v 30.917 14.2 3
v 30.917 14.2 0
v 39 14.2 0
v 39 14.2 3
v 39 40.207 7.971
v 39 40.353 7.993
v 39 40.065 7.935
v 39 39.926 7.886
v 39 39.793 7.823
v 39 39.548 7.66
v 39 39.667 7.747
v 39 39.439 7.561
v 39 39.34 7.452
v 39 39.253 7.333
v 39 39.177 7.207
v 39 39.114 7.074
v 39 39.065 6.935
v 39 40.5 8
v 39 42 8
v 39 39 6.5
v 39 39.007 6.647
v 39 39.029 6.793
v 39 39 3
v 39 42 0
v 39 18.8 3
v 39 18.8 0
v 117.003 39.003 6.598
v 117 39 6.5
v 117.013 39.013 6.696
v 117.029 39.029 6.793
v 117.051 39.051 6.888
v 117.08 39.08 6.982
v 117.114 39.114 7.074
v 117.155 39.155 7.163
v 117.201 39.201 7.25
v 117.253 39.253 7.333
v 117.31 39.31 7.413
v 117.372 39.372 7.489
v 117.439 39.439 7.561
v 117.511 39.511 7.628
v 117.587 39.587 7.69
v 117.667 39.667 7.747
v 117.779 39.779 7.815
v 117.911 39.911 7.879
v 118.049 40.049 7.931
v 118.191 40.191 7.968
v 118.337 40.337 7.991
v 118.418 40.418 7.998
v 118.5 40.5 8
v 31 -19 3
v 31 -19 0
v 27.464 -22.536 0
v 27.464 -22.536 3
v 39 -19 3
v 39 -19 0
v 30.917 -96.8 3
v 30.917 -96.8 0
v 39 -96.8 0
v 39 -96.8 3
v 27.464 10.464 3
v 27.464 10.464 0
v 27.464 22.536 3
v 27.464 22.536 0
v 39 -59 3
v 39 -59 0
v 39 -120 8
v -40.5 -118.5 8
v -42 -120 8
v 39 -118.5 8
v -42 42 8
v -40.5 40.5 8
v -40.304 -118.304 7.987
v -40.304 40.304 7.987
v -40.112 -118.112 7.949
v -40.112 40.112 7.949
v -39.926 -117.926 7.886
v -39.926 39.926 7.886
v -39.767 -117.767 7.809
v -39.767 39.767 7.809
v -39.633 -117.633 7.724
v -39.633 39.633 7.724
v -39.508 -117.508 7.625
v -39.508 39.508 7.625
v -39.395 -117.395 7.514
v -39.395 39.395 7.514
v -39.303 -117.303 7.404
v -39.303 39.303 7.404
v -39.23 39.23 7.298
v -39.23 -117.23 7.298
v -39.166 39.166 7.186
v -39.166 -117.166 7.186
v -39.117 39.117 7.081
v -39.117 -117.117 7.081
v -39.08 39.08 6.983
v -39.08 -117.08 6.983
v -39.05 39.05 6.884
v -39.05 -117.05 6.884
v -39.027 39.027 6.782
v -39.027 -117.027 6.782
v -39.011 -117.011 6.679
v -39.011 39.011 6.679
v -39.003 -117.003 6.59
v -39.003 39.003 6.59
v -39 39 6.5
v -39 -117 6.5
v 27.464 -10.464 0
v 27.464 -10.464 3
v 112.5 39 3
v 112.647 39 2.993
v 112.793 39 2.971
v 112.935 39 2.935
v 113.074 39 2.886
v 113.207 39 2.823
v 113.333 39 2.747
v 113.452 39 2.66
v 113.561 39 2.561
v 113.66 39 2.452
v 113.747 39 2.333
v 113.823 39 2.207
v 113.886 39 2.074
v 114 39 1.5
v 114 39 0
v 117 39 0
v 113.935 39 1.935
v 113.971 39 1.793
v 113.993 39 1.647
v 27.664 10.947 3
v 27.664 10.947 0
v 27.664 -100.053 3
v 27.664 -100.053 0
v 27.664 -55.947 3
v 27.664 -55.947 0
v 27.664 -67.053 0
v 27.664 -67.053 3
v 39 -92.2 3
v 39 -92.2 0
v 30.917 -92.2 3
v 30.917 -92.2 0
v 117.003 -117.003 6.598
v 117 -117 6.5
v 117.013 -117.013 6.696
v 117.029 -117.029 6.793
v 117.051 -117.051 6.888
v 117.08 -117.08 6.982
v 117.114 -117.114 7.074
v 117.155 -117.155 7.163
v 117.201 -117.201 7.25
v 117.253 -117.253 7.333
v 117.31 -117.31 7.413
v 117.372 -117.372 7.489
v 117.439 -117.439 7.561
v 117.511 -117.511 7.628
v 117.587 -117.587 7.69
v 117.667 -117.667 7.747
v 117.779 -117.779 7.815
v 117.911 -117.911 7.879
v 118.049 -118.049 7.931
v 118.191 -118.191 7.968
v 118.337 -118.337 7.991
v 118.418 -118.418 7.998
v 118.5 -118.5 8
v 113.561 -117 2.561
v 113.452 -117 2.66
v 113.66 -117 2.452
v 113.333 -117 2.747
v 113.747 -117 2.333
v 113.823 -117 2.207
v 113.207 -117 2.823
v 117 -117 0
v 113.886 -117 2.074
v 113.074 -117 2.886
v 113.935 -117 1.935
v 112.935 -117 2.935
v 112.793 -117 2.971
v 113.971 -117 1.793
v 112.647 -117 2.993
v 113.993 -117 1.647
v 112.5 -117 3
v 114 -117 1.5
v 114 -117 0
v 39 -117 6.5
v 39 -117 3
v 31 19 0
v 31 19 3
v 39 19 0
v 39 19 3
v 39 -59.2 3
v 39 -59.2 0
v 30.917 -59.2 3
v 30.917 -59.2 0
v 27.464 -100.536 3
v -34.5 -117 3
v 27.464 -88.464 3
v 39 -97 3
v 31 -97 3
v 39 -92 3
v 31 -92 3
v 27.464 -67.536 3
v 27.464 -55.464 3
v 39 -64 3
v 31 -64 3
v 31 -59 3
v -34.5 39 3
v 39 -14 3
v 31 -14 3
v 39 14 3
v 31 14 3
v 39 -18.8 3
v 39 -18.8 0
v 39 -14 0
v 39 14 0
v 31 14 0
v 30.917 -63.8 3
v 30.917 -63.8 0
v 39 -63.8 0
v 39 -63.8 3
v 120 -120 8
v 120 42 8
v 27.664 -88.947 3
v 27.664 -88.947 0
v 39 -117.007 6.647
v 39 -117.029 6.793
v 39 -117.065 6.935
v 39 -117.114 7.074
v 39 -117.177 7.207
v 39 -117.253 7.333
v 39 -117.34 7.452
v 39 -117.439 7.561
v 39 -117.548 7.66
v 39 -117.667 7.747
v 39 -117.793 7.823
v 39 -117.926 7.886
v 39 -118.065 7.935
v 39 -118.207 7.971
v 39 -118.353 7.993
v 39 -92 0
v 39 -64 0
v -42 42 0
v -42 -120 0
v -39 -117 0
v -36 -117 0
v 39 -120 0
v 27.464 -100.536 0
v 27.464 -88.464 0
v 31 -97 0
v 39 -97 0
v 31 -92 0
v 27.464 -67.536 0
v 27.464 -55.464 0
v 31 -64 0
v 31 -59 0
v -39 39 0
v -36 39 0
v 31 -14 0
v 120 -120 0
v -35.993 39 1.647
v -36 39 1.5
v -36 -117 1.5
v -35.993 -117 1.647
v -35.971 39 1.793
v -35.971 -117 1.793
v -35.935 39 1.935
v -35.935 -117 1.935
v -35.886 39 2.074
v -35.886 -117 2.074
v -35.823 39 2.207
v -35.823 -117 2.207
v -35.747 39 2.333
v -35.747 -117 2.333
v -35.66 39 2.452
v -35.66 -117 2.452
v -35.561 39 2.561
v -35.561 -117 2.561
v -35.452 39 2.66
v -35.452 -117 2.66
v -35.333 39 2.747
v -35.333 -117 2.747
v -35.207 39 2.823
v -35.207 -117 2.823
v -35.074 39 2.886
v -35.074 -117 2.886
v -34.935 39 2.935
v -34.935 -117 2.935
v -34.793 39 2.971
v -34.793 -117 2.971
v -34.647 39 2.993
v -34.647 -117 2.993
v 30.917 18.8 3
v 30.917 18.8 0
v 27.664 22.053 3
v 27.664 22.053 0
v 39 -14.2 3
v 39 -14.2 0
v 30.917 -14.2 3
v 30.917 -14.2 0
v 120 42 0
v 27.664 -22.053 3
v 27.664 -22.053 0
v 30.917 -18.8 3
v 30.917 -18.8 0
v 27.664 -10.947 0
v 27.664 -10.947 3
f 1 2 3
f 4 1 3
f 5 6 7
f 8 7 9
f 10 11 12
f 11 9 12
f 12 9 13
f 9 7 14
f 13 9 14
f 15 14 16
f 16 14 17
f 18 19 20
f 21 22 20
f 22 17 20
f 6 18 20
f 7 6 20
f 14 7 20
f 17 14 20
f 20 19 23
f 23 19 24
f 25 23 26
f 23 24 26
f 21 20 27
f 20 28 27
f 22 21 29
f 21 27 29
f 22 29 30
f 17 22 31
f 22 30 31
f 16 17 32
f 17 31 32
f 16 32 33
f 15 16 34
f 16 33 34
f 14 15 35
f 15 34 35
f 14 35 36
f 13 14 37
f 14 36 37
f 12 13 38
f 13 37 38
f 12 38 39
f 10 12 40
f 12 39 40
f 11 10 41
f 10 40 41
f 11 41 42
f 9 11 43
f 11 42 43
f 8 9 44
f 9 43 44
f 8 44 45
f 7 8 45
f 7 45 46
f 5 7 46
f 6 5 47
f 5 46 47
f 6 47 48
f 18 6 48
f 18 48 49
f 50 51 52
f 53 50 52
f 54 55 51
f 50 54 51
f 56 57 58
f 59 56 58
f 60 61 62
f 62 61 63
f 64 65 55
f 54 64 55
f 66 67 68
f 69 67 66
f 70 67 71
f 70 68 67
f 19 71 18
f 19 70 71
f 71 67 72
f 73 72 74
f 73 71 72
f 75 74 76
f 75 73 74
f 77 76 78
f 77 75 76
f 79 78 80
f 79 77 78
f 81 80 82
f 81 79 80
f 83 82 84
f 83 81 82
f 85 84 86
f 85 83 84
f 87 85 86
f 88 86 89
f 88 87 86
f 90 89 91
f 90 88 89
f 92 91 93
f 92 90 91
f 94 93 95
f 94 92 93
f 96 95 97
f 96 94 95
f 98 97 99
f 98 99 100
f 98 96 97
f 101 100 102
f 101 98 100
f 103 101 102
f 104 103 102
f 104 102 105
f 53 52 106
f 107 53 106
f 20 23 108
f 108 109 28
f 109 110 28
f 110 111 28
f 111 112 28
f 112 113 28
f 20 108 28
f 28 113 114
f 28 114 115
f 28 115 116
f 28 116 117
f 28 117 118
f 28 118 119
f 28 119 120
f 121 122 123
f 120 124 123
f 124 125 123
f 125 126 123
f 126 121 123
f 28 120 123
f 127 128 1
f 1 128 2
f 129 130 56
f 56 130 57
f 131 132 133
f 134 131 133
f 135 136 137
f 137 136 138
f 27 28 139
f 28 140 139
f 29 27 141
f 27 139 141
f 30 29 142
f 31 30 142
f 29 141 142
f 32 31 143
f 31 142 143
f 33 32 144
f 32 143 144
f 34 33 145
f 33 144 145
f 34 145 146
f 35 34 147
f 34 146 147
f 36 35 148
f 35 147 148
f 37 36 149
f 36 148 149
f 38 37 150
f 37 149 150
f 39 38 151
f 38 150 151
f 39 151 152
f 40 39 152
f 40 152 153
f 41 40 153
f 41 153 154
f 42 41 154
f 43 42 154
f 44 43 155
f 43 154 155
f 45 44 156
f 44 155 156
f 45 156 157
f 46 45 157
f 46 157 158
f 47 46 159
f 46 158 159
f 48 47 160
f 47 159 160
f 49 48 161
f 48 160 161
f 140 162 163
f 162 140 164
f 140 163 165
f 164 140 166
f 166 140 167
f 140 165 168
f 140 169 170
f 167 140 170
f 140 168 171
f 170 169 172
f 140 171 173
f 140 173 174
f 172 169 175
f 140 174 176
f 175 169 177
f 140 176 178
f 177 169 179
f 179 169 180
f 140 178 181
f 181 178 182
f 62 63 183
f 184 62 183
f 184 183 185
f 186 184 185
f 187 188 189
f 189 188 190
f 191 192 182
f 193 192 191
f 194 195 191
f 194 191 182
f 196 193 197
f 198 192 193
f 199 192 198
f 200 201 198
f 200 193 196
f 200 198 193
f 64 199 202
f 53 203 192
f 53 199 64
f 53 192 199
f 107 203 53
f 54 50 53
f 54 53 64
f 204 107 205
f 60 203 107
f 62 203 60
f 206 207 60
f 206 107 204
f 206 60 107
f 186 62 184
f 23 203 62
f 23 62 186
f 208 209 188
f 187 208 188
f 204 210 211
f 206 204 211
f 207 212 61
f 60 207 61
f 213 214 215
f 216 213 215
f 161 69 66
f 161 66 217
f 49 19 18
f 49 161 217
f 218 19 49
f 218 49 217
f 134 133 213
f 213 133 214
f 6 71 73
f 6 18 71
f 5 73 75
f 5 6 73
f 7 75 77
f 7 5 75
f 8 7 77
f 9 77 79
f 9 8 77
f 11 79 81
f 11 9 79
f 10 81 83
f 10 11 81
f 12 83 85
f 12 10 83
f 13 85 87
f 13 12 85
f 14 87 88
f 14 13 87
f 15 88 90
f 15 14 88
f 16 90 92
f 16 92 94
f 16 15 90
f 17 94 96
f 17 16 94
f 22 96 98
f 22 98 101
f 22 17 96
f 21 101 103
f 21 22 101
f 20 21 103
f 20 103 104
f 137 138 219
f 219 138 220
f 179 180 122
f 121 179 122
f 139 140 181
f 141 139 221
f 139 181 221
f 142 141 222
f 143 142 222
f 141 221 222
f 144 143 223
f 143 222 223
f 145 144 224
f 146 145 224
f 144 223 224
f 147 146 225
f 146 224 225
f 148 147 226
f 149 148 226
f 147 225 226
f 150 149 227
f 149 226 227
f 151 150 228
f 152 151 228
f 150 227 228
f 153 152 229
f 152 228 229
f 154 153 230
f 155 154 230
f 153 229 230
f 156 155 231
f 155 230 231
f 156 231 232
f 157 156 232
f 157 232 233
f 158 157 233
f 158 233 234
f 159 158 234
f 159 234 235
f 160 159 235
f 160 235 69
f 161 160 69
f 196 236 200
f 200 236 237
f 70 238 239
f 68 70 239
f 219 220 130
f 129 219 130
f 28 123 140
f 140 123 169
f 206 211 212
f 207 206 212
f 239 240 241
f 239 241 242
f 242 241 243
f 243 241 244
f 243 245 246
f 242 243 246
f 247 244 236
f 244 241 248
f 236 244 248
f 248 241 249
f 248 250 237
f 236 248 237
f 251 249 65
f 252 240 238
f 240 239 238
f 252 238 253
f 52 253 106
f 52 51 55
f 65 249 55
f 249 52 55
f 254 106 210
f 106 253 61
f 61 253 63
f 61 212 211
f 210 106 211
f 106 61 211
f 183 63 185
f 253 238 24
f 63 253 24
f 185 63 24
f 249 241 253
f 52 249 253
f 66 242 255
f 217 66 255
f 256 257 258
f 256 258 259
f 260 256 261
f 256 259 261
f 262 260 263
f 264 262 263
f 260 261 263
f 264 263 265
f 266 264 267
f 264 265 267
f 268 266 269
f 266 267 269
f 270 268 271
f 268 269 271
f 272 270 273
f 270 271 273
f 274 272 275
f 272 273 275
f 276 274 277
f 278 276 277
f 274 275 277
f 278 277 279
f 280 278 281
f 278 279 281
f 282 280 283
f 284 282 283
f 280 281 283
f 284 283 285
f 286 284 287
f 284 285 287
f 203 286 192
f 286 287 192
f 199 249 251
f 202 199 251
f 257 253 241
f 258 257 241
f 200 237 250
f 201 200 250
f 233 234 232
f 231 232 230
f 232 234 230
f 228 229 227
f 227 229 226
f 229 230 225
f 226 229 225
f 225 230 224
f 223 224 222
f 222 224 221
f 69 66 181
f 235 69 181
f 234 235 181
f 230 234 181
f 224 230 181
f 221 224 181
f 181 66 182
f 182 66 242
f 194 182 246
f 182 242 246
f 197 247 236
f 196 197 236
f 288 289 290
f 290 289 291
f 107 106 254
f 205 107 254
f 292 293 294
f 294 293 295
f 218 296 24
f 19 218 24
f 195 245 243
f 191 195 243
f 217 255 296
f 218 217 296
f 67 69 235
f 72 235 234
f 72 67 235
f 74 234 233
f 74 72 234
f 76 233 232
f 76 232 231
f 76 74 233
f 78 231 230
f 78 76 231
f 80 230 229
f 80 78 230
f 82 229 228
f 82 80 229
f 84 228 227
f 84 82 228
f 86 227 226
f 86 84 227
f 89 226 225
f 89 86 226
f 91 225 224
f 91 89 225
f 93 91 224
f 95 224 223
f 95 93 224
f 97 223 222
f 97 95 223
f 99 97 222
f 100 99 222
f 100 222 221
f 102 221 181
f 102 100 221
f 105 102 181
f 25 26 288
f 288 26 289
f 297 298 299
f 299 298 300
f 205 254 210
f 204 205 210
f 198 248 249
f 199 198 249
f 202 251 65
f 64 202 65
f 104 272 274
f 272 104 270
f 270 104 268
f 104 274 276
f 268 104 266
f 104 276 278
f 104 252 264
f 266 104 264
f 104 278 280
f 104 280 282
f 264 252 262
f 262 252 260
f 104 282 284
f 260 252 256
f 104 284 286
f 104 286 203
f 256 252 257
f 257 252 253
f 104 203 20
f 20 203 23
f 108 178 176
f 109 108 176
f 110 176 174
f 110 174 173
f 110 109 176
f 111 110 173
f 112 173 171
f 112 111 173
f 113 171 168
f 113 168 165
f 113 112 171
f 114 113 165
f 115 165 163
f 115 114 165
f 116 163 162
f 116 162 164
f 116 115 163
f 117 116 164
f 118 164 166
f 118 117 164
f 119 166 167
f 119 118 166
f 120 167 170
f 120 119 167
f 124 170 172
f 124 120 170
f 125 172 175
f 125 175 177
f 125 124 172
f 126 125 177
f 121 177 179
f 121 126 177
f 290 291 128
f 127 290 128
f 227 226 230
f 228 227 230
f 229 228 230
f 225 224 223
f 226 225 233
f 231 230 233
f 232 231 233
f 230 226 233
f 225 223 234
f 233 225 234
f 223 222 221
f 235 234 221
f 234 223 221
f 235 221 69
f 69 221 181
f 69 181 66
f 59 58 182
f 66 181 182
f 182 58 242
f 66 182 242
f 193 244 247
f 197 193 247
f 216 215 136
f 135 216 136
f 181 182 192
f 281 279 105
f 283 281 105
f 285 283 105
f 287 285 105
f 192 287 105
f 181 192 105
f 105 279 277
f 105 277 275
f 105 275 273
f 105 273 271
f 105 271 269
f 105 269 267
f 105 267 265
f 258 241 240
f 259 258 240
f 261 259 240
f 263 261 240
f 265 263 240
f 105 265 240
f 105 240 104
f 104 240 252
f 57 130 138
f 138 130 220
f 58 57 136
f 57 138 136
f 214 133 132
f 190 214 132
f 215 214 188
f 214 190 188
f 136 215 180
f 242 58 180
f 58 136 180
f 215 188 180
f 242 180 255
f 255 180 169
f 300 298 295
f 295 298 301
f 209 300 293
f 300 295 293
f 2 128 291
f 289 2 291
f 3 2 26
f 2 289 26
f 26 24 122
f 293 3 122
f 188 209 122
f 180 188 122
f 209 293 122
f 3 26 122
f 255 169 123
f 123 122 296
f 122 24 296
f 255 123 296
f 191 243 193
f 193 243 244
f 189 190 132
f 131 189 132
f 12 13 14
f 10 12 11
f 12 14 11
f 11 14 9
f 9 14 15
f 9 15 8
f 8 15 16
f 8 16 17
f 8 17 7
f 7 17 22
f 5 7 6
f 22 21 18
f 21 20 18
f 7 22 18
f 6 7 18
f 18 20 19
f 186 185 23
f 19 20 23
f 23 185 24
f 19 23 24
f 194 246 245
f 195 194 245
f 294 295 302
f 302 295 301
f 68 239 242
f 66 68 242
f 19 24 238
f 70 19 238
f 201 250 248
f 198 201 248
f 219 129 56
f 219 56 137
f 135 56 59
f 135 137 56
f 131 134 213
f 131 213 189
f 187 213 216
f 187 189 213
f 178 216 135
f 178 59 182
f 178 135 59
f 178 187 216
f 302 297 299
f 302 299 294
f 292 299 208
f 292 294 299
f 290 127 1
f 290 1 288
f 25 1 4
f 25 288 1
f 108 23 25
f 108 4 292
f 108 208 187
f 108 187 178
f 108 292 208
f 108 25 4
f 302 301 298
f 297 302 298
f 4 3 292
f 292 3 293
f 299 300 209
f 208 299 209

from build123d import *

# Parameters (mm, degrees)
F1_DEPTH = 8
F2_DEPTH = 3
F3_DEPTH = 3
F4_DEPTH = 8
F5_R     = 1.5
F5_2_R   = 1.5


with BuildPart() as f1:
    # F0 (on Top) → F1 (new body)
    with BuildSketch(Plane.XY):
        Polygon((-39, -39), (-39, 39), (-36, 39), (39, 39), (39, 42), (-42, 42), (-42, -39), (-42, -120), (39, -120), (39, -117), (-36, -117), (-39, -117), align=None)
    extrude(amount=F1_DEPTH)

    # F0 (on Top) → F2 (join)
    with BuildSketch(Plane.XY):
        Polygon((39, 39), (-36, 39), (-36, -117), (39, -117), (39, -97), (31, -97), (27.4644660941, -100.5355339059), (27.4644660941, -88.4644660941), (31, -92), (39, -92), (39, -64), (31, -64), (27.4644660941, -67.5355339059), (27.4644660941, -55.4644660941), (31, -59), (39, -59), (39, -19), (31, -19), (27.4644660941, -22.5355339059), (27.4644660941, -10.4644660941), (31, -14), (39, -14), (39, 14), (31, 14), (27.4644660941, 10.4644660941), (27.4644660941, 22.5355339059), (31, 19), (39, 19), align=None)
    extrude(amount=F2_DEPTH)

    # F5
    f5_edges = [f1.edges().sort_by_distance(p)[0] for p in [
        (0, 39, 8),
        (0, -117, 8),
        (-39, -39, 8),
        (-36, -39, 3),
    ]]
    fillet(f5_edges, radius=F5_R)


with BuildPart() as f3:
    # F0 (on Top) → F3 (new body)
    with BuildSketch(Plane.XY):
        Polygon((114, 39), (39, 39), (39, 19), (39, 18.8), (39, 14.2), (39, 14), (39, -14), (39, -14.2), (39, -18.8), (39, -19), (39, -59), (39, -59.2), (39, -63.8), (39, -64), (39, -92), (39, -92.2), (39, -96.8), (39, -97), (39, -117), (114, -117), align=None)
        Polygon((39, 42), (39, 39), (114, 39), (117, 39), (117, -39), (117, -117), (114, -117), (39, -117), (39, -120), (120, -120), (120, -39), (120, 42), align=None)
        Polygon((30.9171572875, -96.8), (39, -96.8), (39, -92.2), (30.9171572875, -92.2), (27.6644660941, -88.9473088065), (27.6644660941, -100.0526911935), align=None)
        Polygon((30.9171572875, -63.8), (39, -63.8), (39, -59.2), (30.9171572875, -59.2), (27.6644660941, -55.9473088065), (27.6644660941, -67.0526911935), align=None)
        Polygon((39, -18.8), (39, -14.2), (30.9171572875, -14.2), (27.6644660941, -10.9473088065), (27.6644660941, -22.0526911935), (30.9171572875, -18.8), align=None)
        Polygon((39, 14.2), (39, 18.8), (30.9171572875, 18.8), (27.6644660941, 22.0526911935), (27.6644660941, 10.9473088065), (30.9171572875, 14.2), align=None)
    extrude(amount=F3_DEPTH)

    # F0 (on Top) → F4 (join)
    with BuildSketch(Plane.XY):
        Polygon((39, 42), (39, 39), (114, 39), (117, 39), (117, -39), (117, -117), (114, -117), (39, -117), (39, -120), (120, -120), (120, -39), (120, 42), align=None)
    extrude(amount=F4_DEPTH)

    # F5#2
    f5_2_edges = [f3.edges().sort_by_distance(p)[0] for p in [
        (78, 39, 8),
        (117, -39, 8),
        (78, -117, 8),
        (114, -39, 3),
    ]]
    fillet(f5_2_edges, radius=F5_2_R)


solid = Compound([f1.part, f3.part])
